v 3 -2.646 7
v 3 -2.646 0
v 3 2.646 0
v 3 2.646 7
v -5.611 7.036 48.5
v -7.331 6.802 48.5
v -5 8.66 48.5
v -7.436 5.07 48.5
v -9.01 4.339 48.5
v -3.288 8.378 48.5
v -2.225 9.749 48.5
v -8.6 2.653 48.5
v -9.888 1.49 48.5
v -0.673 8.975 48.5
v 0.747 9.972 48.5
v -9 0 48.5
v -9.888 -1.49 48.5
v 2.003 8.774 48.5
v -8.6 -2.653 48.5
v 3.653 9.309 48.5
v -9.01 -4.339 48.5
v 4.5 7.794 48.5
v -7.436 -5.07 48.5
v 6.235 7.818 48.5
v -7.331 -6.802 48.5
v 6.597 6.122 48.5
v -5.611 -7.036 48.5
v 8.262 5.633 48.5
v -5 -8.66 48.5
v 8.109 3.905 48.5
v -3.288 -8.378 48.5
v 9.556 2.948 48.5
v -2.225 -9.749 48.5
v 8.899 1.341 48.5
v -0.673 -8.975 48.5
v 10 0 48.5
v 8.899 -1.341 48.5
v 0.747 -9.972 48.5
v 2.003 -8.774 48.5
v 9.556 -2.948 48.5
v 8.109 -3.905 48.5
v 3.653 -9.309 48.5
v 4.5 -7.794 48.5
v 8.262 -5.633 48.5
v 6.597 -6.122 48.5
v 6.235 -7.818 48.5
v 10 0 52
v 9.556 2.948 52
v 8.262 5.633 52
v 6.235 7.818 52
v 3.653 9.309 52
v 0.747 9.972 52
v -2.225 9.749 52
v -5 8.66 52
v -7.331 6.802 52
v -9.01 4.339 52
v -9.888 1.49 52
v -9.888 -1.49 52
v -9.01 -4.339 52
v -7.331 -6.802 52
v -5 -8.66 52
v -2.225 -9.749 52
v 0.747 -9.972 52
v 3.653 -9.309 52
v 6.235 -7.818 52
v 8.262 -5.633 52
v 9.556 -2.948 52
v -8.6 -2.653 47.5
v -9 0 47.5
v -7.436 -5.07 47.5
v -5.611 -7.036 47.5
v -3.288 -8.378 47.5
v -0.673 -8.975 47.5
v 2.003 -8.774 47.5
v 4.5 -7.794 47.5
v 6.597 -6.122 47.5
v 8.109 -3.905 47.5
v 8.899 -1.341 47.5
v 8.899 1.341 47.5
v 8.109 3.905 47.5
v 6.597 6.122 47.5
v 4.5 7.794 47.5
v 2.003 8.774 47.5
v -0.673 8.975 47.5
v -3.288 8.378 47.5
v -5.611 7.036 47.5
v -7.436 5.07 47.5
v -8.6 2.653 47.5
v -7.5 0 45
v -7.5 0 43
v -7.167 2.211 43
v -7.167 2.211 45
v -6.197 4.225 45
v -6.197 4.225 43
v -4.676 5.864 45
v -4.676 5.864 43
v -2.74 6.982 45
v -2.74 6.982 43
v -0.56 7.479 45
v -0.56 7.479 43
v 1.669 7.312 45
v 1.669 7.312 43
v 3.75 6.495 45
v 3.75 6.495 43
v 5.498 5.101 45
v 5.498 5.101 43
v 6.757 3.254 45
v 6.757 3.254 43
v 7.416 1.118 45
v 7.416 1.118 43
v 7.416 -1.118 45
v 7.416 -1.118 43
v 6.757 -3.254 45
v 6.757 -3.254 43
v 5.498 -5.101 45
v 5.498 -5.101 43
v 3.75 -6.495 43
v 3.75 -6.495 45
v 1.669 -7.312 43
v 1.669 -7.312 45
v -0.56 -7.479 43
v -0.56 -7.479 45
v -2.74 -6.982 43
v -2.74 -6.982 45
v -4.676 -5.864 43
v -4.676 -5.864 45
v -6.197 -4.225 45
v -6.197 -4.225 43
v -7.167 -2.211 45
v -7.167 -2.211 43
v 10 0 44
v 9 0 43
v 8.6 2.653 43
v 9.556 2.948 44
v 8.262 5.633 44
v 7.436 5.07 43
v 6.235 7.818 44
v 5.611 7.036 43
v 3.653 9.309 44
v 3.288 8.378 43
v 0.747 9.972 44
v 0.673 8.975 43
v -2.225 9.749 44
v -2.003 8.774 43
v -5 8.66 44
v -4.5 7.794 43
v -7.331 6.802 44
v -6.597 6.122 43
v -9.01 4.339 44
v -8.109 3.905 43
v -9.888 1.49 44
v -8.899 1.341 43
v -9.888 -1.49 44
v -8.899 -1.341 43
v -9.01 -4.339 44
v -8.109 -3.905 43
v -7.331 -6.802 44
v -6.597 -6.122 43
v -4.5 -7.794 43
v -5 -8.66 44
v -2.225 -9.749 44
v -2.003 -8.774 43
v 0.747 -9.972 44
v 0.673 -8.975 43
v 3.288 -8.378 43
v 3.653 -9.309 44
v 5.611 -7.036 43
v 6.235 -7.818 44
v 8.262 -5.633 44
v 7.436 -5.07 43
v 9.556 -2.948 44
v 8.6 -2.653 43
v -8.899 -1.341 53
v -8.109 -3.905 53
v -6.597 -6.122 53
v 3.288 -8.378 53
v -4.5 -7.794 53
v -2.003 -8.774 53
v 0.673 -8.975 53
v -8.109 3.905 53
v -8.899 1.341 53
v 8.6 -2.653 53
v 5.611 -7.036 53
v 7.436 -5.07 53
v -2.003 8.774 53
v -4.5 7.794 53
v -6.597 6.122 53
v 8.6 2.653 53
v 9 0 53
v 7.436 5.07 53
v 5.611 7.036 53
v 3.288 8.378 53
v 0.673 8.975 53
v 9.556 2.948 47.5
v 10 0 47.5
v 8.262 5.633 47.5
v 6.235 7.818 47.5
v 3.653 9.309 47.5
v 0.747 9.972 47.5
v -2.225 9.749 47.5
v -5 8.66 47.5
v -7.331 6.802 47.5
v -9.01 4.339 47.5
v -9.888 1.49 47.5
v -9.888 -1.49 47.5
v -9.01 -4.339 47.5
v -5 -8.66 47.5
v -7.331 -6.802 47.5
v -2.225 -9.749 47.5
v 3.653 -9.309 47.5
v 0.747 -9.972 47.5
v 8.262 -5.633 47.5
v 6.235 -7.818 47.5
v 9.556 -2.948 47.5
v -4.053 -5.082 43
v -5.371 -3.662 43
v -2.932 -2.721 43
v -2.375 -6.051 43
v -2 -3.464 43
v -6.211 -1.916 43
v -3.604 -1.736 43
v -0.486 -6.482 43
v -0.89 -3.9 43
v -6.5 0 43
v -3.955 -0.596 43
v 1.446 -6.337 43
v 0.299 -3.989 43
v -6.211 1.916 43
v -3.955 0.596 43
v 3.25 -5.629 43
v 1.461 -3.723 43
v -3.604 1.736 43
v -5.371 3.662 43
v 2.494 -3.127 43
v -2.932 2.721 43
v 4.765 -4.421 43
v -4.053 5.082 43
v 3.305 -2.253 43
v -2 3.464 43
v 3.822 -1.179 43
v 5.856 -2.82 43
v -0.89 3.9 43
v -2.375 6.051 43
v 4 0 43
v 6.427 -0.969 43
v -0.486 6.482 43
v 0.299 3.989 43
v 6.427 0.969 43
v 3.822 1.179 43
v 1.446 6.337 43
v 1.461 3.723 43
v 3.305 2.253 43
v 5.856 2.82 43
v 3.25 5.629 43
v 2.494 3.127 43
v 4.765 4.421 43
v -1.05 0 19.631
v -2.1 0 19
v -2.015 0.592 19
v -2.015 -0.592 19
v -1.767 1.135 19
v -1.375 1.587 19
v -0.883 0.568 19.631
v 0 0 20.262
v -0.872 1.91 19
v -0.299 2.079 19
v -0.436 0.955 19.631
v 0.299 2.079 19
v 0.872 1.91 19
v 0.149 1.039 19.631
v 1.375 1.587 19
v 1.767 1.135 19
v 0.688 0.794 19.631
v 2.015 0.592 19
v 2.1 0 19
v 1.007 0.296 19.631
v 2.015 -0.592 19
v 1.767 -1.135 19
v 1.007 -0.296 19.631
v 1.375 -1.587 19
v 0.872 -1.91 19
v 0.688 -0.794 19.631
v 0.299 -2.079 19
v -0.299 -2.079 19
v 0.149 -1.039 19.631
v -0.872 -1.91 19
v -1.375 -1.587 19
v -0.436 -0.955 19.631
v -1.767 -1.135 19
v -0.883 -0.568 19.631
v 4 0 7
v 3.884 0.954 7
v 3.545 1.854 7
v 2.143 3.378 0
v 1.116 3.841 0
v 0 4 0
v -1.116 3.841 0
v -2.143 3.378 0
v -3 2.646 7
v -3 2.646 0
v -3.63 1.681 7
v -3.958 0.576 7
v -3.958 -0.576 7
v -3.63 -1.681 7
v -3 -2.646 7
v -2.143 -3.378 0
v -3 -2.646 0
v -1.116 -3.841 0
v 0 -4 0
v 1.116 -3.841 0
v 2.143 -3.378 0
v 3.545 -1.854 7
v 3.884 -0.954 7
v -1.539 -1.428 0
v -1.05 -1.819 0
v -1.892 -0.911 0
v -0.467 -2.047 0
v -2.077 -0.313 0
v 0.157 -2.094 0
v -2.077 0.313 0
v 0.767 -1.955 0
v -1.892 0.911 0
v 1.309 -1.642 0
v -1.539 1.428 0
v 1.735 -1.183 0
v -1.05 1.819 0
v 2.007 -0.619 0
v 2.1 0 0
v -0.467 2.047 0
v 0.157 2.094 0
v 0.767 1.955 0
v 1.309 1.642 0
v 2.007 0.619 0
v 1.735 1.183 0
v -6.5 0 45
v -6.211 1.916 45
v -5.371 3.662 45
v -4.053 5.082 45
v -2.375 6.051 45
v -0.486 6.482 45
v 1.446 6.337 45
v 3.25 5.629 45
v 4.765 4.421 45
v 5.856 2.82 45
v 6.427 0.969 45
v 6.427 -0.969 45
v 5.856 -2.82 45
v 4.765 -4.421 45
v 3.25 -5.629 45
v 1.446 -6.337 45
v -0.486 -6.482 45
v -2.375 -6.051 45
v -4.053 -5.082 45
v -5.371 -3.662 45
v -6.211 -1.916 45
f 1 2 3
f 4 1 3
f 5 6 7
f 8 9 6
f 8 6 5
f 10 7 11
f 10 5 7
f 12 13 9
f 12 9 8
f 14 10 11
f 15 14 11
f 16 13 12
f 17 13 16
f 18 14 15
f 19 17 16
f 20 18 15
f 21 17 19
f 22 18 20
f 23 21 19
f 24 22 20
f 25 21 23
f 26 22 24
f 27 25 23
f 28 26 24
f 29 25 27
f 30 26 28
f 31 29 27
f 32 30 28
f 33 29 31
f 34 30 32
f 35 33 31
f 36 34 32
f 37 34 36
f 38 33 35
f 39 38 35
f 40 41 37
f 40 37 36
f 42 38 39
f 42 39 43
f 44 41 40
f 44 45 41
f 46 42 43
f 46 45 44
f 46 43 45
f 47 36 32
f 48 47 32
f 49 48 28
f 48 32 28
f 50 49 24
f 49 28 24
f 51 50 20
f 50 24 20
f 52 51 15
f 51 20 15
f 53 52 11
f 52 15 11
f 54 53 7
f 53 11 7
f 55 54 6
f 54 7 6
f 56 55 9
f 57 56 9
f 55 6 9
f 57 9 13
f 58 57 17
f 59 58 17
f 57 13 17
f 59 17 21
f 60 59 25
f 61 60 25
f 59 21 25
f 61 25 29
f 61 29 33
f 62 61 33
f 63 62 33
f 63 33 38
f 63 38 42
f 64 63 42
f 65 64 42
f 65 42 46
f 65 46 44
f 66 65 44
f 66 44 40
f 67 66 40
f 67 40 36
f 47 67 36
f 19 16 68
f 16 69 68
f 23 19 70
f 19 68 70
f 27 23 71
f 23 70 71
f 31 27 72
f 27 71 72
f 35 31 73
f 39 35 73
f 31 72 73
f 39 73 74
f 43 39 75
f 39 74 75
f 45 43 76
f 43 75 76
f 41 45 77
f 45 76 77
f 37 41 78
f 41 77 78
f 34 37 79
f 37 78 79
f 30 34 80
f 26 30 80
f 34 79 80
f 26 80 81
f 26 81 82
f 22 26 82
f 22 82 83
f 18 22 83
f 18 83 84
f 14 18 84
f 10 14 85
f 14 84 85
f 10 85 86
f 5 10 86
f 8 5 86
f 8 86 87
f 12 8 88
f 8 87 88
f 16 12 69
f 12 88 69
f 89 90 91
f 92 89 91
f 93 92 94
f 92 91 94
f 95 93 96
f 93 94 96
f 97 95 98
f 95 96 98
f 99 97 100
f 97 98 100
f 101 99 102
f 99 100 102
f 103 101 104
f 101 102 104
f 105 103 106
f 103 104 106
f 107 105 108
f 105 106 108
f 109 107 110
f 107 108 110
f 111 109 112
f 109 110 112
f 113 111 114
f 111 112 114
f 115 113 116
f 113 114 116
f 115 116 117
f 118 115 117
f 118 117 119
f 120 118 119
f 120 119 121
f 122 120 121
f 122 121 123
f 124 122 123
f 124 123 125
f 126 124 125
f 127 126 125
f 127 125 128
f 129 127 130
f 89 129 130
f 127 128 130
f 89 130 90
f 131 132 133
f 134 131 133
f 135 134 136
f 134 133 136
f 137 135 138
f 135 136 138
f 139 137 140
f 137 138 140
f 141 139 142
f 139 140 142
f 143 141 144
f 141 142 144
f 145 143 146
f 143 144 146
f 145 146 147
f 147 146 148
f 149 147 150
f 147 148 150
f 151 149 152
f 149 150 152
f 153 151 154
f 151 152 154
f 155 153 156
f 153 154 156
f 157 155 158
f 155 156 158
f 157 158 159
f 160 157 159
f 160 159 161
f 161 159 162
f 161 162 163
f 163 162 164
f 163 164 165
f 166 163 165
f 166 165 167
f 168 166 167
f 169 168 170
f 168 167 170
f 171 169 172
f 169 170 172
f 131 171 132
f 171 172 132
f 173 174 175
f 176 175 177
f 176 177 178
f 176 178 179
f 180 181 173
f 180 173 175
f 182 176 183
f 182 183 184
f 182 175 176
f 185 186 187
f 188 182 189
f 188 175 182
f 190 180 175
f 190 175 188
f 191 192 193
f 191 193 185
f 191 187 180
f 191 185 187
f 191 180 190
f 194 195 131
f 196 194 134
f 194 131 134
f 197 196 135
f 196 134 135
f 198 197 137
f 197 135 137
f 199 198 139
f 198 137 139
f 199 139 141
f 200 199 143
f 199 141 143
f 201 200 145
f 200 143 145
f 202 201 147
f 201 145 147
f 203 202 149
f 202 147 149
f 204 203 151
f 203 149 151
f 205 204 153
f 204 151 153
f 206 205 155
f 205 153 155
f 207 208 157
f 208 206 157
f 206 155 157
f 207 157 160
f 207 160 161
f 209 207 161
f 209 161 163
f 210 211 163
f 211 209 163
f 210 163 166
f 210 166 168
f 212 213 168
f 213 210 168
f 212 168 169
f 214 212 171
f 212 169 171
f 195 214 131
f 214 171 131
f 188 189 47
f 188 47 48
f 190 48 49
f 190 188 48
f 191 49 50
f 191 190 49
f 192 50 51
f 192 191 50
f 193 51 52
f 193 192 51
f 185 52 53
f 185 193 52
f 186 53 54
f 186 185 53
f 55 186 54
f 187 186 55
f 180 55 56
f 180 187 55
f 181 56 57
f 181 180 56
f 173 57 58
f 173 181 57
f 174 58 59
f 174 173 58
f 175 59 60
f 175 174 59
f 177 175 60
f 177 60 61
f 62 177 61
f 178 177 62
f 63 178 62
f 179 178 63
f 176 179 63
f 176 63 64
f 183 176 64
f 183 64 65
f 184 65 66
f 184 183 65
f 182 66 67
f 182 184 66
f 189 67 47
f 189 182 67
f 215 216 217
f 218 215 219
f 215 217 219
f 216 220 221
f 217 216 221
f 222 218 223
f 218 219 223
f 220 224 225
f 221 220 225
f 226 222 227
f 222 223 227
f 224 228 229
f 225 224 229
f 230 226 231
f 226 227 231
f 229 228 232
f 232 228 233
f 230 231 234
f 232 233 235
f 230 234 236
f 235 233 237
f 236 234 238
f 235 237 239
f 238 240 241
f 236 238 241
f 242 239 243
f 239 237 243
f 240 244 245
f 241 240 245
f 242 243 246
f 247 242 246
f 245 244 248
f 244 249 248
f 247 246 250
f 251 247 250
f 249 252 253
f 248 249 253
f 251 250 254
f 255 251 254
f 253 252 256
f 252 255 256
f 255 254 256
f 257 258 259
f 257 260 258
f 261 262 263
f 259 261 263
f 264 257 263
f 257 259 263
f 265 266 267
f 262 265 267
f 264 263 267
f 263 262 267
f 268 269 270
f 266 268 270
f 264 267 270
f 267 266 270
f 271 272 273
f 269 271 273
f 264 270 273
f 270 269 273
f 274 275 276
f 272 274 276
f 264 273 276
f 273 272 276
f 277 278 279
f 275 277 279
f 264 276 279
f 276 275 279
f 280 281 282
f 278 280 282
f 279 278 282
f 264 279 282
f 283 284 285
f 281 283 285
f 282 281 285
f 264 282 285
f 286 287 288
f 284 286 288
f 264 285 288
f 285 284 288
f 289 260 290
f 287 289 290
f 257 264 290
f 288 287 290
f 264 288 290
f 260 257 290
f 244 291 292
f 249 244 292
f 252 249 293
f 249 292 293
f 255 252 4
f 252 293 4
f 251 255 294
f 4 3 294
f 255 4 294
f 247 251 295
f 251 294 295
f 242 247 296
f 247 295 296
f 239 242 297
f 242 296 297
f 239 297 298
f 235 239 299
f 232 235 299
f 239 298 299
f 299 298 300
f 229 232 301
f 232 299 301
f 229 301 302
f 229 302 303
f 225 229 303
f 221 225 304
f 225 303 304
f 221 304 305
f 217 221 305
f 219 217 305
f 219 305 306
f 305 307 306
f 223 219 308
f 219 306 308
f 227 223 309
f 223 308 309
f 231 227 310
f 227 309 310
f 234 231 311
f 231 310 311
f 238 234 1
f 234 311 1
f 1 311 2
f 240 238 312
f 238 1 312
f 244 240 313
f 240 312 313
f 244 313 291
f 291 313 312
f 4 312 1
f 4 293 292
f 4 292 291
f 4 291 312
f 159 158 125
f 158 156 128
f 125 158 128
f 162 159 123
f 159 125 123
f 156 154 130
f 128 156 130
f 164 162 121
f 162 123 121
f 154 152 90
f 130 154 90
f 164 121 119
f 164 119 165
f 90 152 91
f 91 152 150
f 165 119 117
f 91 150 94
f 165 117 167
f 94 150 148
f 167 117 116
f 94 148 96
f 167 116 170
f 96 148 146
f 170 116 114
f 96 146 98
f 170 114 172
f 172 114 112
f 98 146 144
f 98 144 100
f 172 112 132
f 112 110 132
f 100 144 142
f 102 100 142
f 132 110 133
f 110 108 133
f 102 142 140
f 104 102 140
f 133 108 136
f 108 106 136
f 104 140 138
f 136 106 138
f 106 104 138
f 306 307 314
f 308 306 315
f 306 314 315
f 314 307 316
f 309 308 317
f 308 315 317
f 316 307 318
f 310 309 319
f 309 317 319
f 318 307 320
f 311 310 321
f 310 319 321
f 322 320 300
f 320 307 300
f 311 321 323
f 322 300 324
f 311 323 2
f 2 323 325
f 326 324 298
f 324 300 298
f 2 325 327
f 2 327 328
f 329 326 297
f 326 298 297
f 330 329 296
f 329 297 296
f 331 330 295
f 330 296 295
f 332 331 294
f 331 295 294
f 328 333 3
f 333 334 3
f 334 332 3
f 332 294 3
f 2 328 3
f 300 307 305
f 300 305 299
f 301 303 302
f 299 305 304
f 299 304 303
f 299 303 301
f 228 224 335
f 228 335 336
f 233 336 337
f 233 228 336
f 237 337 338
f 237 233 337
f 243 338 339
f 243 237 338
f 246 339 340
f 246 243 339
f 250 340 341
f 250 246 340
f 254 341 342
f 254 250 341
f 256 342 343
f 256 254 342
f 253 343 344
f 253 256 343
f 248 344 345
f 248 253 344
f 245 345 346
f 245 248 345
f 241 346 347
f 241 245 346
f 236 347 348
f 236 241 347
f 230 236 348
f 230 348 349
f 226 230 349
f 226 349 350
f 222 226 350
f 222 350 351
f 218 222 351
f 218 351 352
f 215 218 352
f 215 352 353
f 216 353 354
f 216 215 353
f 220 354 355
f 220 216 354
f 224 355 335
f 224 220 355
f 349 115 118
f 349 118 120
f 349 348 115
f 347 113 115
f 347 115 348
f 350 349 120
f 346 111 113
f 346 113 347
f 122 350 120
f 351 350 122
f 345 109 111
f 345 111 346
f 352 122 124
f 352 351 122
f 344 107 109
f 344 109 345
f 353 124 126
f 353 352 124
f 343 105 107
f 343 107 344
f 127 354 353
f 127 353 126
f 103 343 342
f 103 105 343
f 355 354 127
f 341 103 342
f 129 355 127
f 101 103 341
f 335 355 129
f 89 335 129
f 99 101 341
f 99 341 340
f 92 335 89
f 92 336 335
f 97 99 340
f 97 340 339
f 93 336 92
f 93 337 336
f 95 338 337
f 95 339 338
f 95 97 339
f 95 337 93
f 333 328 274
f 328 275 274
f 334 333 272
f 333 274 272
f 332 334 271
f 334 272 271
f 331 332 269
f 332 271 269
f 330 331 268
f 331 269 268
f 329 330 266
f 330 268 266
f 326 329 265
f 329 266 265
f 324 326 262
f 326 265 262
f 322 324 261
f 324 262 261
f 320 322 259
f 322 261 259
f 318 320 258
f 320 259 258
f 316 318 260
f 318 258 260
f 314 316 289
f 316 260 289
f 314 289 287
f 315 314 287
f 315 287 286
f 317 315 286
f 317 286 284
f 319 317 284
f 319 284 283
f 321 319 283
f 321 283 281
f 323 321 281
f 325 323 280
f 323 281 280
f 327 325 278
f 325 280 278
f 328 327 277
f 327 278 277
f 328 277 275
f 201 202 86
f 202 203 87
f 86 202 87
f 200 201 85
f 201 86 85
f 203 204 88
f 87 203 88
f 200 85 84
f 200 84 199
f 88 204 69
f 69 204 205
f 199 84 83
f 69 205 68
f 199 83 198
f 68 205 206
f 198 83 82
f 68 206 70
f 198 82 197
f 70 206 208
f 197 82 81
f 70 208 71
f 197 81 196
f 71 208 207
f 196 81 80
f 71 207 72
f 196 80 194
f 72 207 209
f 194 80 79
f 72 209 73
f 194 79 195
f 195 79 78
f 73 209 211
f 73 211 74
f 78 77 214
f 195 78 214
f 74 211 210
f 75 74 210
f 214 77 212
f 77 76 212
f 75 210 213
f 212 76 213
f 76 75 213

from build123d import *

# Parameters (mm, degrees)
ESQUISSE1_R               = 4
BASE_EXTRUSION_DEPTH      = 43
ESQUISSE2_R               = 10
BOSS_EXTRU_1_DEPTH        = 10
ESQUISSE4_W               = 3.314228255
ESQUISSE4_H               = 8.012066365
ESQUISSE4_W_2             = 3.056812469
ESQUISSE4_H_2             = 8.269482152
ENL_V_MAT_EXTRU_1_DEPTH   = 7
CHANFREIN2_SIZE           = 1
ESQUISSE6_W               = 1
ESQUISSE6_H               = 1
TROU_TARAUD_M5X0_81_D     = 4.2
TROU_TARAUD_M5X0_81_DEPTH = 19
TROU_TARAUD_M5X0_81_TIP   = 1.2618073
ESQUISSE10_R              = 7.5
ESQUISSE10_R_2            = 6.5
ENL_V_MAT_EXTRU_2_DEPTH   = 2


with BuildPart() as part:
    # Esquisse1 → Base-Extrusion (new body)
    with BuildSketch(Plane.XY):
        Circle(ESQUISSE1_R)
    extrude(amount=BASE_EXTRUSION_DEPTH)

    # Esquisse2 → Boss.-Extru.1 (add)
    with BuildSketch(Plane.XY.offset(43)):
        Circle(ESQUISSE2_R)
    extrude(amount=BOSS_EXTRU_1_DEPTH)

    # Esquisse4 → Enlèv. mat.-Extru.1 (cut)
    with BuildSketch(Plane(origin=(0, 0, 0), x_dir=(-1, 0, 0), z_dir=(0, 0, -1))):
        with Locations((4.657114127, 0.096530921)):
            Rectangle(ESQUISSE4_W, ESQUISSE4_H)
        with Locations((-4.528406235, -0.032176973)):
            Rectangle(ESQUISSE4_W_2, ESQUISSE4_H_2)
    extrude(amount=-ENL_V_MAT_EXTRU_1_DEPTH, mode=Mode.SUBTRACT)

    # Chanfrein2
    chanfrein2_edges = [part.edges().sort_by_distance(p)[0] for p in [
        (-10, 0, 43),
        (-10, 0, 53),
    ]]
    chamfer(chanfrein2_edges, length=CHANFREIN2_SIZE)

    # Esquisse6 → Enlèvement de matière-Révolution2 (revolve, cut)
    with BuildSketch(Plane(origin=(0, 0, 0), x_dir=(0, 0, -1), z_dir=(1, 0, 0)), mode=Mode.PRIVATE) as enl_vement_de_mati_re_r_volution2_sk:
        with Locations((-48, 9.5)):
            Rectangle(ESQUISSE6_W, ESQUISSE6_H)
    revolve(enl_vement_de_mati_re_r_volution2_sk.sketch.rotate(Axis((0, 0, 53), (0, 0, 1)), 90), axis=Axis((0, 0, 53), (0, 0, 1)), mode=Mode.SUBTRACT)

    # Trou taraudé M5x0.81
    with Locations(Plane(origin=(0, 0, 0), x_dir=(-1, 0, 0), z_dir=(0, 0, -1))):
        with Locations((0, 0)):
            Hole(TROU_TARAUD_M5X0_81_D / 2, depth=TROU_TARAUD_M5X0_81_DEPTH)
            with Locations((0, 0, -(TROU_TARAUD_M5X0_81_DEPTH + TROU_TARAUD_M5X0_81_TIP / 2))):  # 118° drill point
                Cone(0, TROU_TARAUD_M5X0_81_D / 2, TROU_TARAUD_M5X0_81_TIP, mode=Mode.SUBTRACT)

    # Esquisse10 → Enlèv. mat.-Extru.2 (cut)
    with BuildSketch(Plane(origin=(0, 0, 43), x_dir=(-1, 0, 0), z_dir=(0, 0, -1))):
        Circle(ESQUISSE10_R)
        Circle(ESQUISSE10_R_2, mode=Mode.SUBTRACT)
    extrude(amount=-ENL_V_MAT_EXTRU_2_DEPTH, mode=Mode.SUBTRACT)


solid = part.part
